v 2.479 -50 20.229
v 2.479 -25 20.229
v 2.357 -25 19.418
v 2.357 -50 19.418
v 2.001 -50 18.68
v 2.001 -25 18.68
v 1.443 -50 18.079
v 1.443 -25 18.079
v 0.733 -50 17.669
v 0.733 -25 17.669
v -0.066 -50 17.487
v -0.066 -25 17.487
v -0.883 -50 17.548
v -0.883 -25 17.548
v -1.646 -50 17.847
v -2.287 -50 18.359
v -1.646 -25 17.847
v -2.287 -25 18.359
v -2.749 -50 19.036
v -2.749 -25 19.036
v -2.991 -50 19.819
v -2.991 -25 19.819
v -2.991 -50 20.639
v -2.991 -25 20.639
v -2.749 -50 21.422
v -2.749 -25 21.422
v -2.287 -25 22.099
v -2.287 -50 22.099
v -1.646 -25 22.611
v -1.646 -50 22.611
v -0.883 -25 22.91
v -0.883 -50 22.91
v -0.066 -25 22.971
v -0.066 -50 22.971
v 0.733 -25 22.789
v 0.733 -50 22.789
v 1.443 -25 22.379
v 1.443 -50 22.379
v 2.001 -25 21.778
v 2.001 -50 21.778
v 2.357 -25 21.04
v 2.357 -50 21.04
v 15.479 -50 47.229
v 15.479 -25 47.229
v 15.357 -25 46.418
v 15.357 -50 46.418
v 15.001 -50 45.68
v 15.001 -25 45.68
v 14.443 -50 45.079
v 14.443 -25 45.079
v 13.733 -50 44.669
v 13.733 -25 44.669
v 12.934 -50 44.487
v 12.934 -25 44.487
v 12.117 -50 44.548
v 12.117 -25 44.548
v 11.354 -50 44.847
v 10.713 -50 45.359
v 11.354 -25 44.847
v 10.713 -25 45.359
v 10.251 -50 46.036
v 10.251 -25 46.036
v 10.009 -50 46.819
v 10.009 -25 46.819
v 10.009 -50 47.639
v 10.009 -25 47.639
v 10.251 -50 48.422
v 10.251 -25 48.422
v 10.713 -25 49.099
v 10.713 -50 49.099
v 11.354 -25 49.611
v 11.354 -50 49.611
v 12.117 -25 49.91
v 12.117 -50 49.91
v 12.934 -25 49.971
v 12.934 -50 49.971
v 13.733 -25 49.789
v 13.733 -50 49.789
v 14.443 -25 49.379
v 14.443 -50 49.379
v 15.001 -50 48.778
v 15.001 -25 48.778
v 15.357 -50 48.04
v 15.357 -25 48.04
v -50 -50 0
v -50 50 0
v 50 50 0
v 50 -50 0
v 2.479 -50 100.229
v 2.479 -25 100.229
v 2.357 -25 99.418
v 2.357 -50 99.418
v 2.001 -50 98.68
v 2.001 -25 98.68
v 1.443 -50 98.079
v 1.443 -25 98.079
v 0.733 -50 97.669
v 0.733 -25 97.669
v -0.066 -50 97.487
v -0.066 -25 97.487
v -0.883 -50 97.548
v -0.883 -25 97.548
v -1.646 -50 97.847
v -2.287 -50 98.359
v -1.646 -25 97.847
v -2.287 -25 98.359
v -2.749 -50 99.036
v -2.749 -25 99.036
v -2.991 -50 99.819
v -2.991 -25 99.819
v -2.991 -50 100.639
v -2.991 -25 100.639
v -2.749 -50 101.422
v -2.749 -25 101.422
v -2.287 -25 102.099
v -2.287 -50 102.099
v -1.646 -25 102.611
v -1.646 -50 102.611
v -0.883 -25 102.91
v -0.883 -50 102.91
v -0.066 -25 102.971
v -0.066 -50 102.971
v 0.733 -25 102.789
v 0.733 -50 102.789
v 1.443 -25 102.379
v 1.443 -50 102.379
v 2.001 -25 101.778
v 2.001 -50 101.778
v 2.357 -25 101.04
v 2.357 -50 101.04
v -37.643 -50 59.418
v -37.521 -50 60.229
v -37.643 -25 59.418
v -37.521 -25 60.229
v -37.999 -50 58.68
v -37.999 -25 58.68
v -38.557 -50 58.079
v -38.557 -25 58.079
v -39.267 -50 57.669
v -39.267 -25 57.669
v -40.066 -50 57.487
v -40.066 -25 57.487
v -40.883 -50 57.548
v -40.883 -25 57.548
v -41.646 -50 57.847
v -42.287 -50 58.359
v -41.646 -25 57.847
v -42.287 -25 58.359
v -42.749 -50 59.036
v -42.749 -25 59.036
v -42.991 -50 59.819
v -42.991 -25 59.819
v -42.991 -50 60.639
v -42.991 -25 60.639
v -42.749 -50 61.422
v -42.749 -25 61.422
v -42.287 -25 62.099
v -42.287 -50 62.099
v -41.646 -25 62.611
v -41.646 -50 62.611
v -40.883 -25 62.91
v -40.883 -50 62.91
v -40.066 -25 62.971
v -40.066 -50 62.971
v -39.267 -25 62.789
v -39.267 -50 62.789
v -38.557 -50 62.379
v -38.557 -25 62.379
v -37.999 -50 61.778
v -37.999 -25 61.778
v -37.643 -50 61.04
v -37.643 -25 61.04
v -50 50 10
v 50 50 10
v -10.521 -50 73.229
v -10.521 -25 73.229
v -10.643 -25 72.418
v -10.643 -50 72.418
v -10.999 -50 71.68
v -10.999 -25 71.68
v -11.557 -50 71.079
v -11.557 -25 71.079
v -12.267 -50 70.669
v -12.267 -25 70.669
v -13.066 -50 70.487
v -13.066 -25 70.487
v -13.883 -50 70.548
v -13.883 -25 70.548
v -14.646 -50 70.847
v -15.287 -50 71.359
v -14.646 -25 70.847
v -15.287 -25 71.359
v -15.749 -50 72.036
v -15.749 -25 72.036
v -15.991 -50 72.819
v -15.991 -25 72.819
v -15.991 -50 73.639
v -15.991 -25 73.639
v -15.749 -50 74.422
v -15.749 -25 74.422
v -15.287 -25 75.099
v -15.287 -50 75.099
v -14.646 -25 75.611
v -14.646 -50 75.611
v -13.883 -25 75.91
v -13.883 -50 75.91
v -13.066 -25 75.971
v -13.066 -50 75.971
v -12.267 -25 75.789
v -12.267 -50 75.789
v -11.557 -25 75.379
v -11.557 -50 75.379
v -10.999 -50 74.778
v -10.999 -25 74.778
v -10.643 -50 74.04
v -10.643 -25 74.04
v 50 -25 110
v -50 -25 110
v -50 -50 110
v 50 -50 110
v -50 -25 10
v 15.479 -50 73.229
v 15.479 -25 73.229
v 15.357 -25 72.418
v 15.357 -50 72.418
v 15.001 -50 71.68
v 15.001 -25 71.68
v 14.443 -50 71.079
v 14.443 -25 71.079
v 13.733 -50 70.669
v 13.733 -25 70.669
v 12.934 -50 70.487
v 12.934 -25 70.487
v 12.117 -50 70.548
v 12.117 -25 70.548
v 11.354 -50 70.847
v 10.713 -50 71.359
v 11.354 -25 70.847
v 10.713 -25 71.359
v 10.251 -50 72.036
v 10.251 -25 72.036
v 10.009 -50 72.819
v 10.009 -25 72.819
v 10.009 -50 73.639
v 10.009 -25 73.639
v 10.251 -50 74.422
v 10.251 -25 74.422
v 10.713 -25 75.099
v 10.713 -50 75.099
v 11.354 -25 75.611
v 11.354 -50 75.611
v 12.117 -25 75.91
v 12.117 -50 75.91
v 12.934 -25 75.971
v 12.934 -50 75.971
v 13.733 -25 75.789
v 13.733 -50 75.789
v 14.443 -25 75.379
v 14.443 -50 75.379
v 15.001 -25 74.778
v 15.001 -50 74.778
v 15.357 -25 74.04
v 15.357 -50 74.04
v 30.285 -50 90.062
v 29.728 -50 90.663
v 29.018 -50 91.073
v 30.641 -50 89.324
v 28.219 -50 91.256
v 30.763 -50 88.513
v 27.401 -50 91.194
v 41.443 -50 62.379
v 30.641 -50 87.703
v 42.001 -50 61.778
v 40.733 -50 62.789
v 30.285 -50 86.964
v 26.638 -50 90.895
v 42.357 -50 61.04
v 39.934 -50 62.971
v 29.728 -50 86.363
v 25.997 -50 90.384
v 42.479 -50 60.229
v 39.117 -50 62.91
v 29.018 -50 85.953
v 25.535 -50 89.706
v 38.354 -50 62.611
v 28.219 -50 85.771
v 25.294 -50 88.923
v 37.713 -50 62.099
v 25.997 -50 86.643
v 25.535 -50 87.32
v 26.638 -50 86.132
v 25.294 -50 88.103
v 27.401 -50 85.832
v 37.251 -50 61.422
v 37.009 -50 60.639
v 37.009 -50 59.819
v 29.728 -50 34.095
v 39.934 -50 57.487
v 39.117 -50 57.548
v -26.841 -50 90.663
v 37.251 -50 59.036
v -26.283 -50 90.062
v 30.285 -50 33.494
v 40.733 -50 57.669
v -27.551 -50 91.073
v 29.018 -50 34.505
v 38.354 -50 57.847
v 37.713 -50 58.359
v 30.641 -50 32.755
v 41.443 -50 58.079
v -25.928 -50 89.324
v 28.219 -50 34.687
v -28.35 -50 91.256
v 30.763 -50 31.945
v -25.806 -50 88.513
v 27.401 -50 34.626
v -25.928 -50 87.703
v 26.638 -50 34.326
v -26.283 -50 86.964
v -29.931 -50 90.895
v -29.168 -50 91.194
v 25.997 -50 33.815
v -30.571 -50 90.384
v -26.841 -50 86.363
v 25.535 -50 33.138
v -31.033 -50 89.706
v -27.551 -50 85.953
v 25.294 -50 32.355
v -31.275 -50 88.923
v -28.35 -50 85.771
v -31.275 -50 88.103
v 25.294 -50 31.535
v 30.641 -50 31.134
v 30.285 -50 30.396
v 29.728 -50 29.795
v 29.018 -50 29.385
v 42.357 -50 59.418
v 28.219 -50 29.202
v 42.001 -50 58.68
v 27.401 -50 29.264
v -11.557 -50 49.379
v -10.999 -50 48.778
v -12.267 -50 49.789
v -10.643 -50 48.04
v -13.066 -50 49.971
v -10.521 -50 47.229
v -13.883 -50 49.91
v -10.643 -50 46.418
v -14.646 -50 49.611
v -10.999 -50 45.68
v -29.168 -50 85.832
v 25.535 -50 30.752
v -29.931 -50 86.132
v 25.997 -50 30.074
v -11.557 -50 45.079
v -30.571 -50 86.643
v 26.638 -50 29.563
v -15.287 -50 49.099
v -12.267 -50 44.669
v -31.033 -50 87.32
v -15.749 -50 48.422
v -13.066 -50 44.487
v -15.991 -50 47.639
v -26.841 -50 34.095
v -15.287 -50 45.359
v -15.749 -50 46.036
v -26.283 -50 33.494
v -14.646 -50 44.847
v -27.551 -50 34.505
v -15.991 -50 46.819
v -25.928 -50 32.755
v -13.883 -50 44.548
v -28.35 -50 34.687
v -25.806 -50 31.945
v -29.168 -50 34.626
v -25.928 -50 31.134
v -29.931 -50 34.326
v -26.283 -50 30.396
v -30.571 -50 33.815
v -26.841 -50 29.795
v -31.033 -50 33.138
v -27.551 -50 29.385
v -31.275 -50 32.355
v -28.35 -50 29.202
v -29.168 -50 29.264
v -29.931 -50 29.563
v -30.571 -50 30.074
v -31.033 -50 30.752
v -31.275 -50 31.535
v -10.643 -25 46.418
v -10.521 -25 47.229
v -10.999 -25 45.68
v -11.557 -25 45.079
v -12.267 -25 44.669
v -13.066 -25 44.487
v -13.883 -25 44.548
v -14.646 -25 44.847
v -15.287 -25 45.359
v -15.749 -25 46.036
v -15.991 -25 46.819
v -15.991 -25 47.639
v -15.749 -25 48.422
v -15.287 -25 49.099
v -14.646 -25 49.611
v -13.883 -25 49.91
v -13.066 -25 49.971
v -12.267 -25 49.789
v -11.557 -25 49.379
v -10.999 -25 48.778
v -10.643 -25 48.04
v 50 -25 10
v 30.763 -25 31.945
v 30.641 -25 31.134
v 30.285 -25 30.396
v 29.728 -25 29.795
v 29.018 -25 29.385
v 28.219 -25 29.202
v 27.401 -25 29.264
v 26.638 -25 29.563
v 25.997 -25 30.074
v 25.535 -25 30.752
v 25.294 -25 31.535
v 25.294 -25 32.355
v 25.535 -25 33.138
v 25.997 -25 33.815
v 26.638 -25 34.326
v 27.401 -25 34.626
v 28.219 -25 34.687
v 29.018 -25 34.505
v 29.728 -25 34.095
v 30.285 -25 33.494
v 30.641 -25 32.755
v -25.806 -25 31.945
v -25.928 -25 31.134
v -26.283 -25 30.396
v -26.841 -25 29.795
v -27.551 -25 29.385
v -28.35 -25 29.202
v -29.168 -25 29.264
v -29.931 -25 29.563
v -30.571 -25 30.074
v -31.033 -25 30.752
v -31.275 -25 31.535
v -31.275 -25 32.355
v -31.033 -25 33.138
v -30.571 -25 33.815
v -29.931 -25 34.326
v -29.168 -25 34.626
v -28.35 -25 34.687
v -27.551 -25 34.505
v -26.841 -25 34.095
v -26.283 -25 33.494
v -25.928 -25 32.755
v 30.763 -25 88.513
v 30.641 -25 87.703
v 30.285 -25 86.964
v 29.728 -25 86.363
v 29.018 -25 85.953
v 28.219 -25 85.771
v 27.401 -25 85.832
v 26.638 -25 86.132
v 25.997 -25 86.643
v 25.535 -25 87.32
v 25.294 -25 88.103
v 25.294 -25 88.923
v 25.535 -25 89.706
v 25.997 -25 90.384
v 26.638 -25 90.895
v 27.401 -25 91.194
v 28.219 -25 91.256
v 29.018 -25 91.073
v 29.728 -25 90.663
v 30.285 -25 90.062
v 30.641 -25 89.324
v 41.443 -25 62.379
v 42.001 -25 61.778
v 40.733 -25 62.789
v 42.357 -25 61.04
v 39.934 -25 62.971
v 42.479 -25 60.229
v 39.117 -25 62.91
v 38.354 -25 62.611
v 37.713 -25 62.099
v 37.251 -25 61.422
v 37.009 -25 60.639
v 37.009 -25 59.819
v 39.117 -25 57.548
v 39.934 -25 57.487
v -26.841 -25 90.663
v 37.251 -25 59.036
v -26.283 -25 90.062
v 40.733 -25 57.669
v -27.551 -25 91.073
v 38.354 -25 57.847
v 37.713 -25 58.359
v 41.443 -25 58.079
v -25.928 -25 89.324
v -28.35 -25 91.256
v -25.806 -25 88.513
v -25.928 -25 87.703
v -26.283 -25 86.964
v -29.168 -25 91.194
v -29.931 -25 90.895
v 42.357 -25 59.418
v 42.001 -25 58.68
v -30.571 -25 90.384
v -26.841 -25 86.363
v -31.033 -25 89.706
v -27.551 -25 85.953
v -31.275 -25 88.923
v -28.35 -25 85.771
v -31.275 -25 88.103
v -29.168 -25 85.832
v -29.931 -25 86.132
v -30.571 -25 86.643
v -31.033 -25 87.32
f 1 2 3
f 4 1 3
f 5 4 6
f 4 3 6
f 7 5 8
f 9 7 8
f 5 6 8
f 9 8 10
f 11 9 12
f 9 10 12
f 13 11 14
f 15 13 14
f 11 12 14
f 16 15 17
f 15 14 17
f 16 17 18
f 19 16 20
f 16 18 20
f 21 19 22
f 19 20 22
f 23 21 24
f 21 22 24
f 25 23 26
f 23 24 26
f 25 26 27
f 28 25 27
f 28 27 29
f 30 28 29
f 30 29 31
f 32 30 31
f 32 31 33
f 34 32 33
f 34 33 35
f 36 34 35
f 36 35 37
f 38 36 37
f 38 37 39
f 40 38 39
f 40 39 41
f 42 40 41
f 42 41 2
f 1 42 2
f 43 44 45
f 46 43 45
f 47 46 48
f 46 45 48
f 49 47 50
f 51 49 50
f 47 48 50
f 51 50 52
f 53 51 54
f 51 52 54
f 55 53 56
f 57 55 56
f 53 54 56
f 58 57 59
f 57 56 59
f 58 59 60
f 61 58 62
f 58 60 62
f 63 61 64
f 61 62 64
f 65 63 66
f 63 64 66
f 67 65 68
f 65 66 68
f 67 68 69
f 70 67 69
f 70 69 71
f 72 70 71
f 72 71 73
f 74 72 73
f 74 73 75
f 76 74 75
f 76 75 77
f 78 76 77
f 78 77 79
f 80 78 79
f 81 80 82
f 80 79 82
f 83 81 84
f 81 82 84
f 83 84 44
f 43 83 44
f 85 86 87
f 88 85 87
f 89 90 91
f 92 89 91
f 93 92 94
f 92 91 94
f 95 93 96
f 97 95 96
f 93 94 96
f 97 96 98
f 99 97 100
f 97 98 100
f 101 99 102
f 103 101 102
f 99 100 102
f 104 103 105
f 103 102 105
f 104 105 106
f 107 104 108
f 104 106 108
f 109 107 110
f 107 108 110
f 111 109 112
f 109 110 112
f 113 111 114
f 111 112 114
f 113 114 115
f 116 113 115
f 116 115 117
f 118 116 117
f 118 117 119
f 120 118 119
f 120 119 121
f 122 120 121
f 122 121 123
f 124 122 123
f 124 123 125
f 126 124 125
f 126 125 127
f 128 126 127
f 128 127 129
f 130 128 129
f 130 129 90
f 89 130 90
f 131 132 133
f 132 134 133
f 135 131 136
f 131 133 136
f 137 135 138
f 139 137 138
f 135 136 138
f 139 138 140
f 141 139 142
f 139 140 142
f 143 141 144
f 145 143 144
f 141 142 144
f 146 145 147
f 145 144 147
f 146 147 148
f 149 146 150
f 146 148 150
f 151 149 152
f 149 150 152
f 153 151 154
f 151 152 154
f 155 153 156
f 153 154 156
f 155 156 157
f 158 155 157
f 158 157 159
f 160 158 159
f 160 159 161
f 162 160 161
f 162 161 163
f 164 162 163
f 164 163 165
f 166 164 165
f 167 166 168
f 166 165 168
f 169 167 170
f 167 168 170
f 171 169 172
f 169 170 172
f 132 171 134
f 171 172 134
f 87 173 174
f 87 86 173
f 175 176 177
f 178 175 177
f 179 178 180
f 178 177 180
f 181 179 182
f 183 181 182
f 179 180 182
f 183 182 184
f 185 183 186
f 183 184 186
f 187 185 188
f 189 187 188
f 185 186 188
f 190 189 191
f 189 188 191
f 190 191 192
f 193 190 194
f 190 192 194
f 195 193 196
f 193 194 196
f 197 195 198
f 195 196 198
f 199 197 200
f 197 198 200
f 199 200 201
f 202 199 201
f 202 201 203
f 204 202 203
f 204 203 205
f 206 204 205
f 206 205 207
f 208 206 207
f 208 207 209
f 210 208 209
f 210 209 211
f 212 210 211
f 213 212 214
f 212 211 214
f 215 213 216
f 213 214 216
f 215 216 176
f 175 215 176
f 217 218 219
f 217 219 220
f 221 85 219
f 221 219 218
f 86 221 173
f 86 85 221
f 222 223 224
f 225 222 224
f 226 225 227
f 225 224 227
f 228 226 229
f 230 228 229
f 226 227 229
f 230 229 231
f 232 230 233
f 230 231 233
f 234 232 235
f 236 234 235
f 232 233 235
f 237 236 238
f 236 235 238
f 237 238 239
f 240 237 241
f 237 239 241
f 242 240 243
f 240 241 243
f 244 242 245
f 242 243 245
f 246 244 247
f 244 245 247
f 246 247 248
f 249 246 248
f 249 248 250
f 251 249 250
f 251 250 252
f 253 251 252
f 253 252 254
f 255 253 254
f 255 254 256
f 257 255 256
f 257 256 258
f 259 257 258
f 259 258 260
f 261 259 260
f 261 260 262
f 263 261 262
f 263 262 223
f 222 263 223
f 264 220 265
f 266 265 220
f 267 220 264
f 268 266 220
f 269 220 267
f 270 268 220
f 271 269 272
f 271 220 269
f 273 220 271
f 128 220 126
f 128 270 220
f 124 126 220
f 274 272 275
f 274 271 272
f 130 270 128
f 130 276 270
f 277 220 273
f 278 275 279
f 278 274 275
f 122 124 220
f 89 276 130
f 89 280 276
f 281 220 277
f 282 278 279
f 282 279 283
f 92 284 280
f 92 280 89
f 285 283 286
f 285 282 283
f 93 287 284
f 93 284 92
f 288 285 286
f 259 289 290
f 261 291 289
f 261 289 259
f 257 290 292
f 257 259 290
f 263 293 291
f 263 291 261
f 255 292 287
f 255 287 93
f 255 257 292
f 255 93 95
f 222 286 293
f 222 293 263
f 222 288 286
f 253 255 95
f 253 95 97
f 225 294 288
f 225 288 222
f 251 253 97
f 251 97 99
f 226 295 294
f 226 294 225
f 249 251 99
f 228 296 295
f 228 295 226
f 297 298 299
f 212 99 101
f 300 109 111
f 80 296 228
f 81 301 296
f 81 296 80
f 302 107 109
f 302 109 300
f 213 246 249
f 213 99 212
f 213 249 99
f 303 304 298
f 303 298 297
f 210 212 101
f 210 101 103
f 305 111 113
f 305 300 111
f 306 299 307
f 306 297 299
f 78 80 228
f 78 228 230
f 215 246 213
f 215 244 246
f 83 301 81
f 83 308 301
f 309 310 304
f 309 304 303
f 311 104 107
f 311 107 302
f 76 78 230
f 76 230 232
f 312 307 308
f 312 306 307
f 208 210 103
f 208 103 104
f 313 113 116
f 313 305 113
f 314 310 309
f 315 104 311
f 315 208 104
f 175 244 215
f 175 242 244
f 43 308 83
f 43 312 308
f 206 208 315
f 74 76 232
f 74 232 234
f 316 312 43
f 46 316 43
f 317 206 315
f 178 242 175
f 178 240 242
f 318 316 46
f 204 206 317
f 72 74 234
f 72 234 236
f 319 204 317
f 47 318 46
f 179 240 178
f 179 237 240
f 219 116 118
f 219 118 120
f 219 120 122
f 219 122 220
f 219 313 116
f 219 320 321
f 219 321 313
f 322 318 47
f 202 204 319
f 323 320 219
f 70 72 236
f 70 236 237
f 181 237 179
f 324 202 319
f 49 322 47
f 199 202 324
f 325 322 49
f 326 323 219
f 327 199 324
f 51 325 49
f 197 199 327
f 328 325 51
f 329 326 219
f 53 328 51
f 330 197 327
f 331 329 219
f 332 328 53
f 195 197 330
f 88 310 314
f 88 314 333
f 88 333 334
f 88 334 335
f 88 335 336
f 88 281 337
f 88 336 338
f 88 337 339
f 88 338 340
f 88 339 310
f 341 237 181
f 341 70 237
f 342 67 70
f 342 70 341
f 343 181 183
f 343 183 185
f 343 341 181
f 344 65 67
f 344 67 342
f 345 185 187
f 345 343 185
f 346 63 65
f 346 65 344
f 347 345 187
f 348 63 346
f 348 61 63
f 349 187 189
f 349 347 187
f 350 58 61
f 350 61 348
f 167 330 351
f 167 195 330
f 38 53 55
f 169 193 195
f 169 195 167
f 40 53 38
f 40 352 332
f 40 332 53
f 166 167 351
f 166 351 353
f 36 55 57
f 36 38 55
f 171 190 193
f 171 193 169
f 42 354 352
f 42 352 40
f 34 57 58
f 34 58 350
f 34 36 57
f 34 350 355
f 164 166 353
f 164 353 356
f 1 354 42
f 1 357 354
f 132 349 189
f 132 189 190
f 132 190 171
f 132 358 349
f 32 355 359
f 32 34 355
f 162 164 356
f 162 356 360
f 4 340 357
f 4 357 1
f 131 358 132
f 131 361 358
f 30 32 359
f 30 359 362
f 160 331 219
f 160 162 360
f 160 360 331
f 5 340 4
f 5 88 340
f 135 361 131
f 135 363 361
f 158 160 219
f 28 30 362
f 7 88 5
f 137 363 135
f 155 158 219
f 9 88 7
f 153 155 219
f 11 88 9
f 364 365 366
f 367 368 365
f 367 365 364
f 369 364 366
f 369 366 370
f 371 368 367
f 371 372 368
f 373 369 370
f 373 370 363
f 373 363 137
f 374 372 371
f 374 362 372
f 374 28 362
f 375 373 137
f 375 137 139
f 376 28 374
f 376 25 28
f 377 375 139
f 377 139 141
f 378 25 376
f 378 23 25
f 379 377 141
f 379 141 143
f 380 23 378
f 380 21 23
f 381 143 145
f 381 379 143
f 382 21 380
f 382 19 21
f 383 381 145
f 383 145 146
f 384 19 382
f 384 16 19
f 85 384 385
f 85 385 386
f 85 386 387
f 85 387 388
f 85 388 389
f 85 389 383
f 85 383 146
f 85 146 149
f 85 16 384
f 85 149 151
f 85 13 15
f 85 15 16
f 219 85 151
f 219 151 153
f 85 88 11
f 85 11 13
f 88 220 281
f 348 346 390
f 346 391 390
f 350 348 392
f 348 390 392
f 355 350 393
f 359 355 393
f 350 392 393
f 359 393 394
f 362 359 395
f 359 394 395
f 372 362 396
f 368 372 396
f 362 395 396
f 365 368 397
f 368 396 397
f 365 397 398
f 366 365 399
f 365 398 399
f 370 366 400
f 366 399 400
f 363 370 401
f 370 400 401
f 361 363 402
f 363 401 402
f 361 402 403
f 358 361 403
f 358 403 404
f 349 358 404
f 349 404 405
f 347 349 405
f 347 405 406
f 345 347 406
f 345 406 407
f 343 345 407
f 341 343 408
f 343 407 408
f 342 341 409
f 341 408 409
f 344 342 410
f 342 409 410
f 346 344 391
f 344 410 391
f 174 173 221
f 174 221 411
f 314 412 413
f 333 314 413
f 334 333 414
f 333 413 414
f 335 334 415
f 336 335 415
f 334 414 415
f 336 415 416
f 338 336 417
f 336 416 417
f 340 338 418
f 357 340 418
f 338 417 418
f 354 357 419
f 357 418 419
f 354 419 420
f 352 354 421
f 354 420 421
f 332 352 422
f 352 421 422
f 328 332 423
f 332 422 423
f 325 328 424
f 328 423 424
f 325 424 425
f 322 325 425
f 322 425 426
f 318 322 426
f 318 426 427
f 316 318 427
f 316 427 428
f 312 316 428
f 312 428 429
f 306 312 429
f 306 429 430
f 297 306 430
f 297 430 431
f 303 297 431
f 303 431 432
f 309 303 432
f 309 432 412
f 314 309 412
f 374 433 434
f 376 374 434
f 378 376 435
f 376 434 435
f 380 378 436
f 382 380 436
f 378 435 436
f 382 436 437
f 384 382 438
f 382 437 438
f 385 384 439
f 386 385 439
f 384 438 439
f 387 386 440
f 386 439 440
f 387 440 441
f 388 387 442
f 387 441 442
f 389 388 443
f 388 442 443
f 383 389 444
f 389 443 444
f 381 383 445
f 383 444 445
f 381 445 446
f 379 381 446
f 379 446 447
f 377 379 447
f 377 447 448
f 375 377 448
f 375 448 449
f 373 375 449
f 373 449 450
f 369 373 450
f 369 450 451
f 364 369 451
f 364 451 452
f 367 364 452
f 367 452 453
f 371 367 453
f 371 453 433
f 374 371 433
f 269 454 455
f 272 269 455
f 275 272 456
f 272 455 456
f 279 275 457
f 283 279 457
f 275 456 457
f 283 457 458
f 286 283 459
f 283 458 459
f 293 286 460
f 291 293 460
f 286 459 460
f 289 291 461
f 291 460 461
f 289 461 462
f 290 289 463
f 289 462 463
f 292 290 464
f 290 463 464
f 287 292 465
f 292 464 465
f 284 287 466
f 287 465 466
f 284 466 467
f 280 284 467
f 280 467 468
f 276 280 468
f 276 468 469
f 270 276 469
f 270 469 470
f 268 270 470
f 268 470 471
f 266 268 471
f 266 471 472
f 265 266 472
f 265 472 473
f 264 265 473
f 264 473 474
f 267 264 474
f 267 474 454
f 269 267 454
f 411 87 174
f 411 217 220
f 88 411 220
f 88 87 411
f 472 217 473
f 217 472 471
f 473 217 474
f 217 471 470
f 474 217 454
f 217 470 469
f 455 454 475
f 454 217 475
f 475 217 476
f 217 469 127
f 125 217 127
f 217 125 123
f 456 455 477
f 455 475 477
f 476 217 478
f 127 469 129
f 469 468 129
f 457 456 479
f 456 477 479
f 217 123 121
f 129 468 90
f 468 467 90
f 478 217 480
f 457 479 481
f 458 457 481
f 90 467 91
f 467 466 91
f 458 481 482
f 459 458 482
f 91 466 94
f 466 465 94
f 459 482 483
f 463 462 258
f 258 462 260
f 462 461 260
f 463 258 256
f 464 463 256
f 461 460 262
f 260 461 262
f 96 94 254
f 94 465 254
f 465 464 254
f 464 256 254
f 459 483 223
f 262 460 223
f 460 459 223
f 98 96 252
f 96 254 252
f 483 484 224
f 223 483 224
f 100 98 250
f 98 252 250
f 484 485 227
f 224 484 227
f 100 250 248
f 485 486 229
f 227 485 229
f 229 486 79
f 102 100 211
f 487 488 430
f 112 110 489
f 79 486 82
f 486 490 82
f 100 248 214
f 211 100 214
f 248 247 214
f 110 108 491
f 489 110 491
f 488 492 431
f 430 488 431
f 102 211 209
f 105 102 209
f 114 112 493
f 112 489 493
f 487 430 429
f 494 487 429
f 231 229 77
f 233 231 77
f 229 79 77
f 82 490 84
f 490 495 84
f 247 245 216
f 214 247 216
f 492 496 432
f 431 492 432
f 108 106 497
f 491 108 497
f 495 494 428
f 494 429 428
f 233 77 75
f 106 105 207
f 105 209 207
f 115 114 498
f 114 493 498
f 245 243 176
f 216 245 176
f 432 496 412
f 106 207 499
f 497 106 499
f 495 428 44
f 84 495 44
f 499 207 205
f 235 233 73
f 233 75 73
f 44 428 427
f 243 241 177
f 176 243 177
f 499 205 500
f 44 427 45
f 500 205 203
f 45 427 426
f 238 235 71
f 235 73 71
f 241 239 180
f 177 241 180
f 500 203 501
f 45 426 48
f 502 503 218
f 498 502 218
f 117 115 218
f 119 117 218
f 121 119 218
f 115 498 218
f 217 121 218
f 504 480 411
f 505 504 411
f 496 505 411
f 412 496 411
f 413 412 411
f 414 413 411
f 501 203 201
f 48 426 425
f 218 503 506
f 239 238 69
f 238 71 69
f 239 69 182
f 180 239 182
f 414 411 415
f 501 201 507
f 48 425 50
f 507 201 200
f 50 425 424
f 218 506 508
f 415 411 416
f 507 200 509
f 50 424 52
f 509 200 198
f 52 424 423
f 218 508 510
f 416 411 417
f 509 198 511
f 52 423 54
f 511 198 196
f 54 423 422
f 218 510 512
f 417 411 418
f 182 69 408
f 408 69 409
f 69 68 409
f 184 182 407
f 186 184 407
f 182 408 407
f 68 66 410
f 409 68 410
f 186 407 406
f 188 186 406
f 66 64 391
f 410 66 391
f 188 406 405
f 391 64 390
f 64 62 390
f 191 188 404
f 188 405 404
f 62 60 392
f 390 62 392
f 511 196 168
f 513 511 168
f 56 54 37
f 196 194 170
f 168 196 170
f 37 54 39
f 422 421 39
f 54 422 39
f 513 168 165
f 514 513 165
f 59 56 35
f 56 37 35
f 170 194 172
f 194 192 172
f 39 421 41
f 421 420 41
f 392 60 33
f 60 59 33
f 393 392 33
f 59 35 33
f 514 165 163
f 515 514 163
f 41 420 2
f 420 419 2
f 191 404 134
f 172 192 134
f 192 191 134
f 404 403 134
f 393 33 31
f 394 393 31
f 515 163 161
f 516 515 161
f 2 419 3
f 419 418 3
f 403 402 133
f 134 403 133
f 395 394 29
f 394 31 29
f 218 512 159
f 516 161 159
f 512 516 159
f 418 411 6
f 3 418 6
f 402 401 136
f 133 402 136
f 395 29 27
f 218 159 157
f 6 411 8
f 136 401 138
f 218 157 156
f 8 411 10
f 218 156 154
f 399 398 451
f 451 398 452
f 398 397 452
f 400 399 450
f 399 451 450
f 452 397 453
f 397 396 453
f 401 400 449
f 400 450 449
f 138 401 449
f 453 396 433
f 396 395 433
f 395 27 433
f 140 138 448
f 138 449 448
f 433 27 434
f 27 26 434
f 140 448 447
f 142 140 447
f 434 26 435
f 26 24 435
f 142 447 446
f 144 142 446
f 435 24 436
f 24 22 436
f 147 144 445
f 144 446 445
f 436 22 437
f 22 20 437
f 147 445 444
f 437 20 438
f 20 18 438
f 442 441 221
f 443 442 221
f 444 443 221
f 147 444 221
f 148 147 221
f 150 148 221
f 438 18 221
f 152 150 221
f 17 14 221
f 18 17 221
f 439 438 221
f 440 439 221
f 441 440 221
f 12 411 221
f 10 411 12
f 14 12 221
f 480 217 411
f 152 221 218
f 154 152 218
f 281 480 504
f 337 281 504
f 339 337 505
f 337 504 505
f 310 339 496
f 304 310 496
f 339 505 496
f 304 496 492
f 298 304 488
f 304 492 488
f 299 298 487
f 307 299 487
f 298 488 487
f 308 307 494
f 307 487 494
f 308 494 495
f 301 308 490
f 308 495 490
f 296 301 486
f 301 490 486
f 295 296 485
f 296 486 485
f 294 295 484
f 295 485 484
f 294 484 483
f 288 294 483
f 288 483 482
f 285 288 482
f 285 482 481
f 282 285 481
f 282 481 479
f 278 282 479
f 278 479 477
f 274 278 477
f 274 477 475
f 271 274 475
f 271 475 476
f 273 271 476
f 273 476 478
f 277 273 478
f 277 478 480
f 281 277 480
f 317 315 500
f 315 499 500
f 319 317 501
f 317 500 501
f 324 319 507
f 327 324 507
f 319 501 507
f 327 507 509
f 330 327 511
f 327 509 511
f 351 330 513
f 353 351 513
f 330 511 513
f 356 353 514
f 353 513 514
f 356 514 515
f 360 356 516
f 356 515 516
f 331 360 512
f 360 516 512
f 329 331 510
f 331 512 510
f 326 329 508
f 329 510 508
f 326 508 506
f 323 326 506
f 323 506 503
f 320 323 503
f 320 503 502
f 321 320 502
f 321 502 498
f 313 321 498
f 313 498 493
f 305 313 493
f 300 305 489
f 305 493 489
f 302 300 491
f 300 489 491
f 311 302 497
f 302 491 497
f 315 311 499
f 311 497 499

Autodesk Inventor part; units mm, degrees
ref_plane "YZ Plane" through (0, 0, 0) normal (1, 0, 0) x (0, 1, 0)
ref_plane "XZ Plane" through (0, 0, 0) normal (0, 1, 0) x (-1, 0, 0)
ref_plane "XY Plane" through (0, 0, 0) normal (0, 0, 1) x (1, 0, 0)
sketch "Szkic1" plane through (0, 0, 0) normal (0, 0, 1) x (1, 0, 0)
  line L0 (-50, 50) -> (50, 50)
  line L1 (50, 50) -> (50, -50)
  line L2 (50, -50) -> (-50, -50)
  line L3 (-50, -50) -> (-50, 50)
  point P0 (0, 0)
  point P1 (0, 50)
  point P2 (-50, 0)
  dimension "d0" = 100
  dimension "d1" = 100
extrude "Wyciągnięcie proste1" add sketch "Szkic1" along normal blind 10
sketch "Szkic2" plane through (0, 0, 10) normal (0, 0, 1) x (1, 0, 0)
  line L0 (-50, -50) -> (50, -50) projected
  line L1 (50, -50) -> (50, 50) projected
  line L2 (-50, -50) -> (50, -50)
  line L3 (50, -50) -> (50, -25)
  line L4 (50, -25) -> (-50, -25)
  line L5 (-50, -25) -> (-50, -50)
  point P0 (0, 0)
  dimension "d4" = 25
extrude "Wyciągnięcie proste2" add sketch "Szkic2" along normal blind 100
sketch "Szkic3" plane through (-50, -25, 10) normal (0, 1, 0) x (1, 0, 0)
  circle A0 centre (49.7287, -50.229) radius 50
  circle A1 centre (36.7287, -37.229) radius 2.75
  circle A2 centre (36.7287, -63.229) radius 2.75
  circle A3 centre (62.7287, -37.229) radius 2.75
  circle A4 centre (62.7287, -63.229) radius 2.75
  circle A5 centre (78.013, -78.5133) radius 2.75
  circle A6 centre (89.7287, -50.229) radius 2.75
  circle A7 centre (78.013, -21.9447) radius 2.75
  circle A8 centre (49.7287, -10.229) radius 2.75
  circle A9 centre (21.4444, -21.9447) radius 2.75
  circle A10 centre (9.7287, -50.229) radius 2.75
  circle A11 centre (21.4444, -78.5133) radius 2.75
  circle A12 centre (49.7287, -90.229) radius 2.75
  point P0 (50, 10)
extrude "Wyciągnięcie proste3" cut sketch "Szkic3" against normal blind 100 contours A1 | A2 | A3 | A4 | A5 | A6 | A7 | A8 | A9 | A10 | A11 | A12
properties part number "uchwyt chwytak"
